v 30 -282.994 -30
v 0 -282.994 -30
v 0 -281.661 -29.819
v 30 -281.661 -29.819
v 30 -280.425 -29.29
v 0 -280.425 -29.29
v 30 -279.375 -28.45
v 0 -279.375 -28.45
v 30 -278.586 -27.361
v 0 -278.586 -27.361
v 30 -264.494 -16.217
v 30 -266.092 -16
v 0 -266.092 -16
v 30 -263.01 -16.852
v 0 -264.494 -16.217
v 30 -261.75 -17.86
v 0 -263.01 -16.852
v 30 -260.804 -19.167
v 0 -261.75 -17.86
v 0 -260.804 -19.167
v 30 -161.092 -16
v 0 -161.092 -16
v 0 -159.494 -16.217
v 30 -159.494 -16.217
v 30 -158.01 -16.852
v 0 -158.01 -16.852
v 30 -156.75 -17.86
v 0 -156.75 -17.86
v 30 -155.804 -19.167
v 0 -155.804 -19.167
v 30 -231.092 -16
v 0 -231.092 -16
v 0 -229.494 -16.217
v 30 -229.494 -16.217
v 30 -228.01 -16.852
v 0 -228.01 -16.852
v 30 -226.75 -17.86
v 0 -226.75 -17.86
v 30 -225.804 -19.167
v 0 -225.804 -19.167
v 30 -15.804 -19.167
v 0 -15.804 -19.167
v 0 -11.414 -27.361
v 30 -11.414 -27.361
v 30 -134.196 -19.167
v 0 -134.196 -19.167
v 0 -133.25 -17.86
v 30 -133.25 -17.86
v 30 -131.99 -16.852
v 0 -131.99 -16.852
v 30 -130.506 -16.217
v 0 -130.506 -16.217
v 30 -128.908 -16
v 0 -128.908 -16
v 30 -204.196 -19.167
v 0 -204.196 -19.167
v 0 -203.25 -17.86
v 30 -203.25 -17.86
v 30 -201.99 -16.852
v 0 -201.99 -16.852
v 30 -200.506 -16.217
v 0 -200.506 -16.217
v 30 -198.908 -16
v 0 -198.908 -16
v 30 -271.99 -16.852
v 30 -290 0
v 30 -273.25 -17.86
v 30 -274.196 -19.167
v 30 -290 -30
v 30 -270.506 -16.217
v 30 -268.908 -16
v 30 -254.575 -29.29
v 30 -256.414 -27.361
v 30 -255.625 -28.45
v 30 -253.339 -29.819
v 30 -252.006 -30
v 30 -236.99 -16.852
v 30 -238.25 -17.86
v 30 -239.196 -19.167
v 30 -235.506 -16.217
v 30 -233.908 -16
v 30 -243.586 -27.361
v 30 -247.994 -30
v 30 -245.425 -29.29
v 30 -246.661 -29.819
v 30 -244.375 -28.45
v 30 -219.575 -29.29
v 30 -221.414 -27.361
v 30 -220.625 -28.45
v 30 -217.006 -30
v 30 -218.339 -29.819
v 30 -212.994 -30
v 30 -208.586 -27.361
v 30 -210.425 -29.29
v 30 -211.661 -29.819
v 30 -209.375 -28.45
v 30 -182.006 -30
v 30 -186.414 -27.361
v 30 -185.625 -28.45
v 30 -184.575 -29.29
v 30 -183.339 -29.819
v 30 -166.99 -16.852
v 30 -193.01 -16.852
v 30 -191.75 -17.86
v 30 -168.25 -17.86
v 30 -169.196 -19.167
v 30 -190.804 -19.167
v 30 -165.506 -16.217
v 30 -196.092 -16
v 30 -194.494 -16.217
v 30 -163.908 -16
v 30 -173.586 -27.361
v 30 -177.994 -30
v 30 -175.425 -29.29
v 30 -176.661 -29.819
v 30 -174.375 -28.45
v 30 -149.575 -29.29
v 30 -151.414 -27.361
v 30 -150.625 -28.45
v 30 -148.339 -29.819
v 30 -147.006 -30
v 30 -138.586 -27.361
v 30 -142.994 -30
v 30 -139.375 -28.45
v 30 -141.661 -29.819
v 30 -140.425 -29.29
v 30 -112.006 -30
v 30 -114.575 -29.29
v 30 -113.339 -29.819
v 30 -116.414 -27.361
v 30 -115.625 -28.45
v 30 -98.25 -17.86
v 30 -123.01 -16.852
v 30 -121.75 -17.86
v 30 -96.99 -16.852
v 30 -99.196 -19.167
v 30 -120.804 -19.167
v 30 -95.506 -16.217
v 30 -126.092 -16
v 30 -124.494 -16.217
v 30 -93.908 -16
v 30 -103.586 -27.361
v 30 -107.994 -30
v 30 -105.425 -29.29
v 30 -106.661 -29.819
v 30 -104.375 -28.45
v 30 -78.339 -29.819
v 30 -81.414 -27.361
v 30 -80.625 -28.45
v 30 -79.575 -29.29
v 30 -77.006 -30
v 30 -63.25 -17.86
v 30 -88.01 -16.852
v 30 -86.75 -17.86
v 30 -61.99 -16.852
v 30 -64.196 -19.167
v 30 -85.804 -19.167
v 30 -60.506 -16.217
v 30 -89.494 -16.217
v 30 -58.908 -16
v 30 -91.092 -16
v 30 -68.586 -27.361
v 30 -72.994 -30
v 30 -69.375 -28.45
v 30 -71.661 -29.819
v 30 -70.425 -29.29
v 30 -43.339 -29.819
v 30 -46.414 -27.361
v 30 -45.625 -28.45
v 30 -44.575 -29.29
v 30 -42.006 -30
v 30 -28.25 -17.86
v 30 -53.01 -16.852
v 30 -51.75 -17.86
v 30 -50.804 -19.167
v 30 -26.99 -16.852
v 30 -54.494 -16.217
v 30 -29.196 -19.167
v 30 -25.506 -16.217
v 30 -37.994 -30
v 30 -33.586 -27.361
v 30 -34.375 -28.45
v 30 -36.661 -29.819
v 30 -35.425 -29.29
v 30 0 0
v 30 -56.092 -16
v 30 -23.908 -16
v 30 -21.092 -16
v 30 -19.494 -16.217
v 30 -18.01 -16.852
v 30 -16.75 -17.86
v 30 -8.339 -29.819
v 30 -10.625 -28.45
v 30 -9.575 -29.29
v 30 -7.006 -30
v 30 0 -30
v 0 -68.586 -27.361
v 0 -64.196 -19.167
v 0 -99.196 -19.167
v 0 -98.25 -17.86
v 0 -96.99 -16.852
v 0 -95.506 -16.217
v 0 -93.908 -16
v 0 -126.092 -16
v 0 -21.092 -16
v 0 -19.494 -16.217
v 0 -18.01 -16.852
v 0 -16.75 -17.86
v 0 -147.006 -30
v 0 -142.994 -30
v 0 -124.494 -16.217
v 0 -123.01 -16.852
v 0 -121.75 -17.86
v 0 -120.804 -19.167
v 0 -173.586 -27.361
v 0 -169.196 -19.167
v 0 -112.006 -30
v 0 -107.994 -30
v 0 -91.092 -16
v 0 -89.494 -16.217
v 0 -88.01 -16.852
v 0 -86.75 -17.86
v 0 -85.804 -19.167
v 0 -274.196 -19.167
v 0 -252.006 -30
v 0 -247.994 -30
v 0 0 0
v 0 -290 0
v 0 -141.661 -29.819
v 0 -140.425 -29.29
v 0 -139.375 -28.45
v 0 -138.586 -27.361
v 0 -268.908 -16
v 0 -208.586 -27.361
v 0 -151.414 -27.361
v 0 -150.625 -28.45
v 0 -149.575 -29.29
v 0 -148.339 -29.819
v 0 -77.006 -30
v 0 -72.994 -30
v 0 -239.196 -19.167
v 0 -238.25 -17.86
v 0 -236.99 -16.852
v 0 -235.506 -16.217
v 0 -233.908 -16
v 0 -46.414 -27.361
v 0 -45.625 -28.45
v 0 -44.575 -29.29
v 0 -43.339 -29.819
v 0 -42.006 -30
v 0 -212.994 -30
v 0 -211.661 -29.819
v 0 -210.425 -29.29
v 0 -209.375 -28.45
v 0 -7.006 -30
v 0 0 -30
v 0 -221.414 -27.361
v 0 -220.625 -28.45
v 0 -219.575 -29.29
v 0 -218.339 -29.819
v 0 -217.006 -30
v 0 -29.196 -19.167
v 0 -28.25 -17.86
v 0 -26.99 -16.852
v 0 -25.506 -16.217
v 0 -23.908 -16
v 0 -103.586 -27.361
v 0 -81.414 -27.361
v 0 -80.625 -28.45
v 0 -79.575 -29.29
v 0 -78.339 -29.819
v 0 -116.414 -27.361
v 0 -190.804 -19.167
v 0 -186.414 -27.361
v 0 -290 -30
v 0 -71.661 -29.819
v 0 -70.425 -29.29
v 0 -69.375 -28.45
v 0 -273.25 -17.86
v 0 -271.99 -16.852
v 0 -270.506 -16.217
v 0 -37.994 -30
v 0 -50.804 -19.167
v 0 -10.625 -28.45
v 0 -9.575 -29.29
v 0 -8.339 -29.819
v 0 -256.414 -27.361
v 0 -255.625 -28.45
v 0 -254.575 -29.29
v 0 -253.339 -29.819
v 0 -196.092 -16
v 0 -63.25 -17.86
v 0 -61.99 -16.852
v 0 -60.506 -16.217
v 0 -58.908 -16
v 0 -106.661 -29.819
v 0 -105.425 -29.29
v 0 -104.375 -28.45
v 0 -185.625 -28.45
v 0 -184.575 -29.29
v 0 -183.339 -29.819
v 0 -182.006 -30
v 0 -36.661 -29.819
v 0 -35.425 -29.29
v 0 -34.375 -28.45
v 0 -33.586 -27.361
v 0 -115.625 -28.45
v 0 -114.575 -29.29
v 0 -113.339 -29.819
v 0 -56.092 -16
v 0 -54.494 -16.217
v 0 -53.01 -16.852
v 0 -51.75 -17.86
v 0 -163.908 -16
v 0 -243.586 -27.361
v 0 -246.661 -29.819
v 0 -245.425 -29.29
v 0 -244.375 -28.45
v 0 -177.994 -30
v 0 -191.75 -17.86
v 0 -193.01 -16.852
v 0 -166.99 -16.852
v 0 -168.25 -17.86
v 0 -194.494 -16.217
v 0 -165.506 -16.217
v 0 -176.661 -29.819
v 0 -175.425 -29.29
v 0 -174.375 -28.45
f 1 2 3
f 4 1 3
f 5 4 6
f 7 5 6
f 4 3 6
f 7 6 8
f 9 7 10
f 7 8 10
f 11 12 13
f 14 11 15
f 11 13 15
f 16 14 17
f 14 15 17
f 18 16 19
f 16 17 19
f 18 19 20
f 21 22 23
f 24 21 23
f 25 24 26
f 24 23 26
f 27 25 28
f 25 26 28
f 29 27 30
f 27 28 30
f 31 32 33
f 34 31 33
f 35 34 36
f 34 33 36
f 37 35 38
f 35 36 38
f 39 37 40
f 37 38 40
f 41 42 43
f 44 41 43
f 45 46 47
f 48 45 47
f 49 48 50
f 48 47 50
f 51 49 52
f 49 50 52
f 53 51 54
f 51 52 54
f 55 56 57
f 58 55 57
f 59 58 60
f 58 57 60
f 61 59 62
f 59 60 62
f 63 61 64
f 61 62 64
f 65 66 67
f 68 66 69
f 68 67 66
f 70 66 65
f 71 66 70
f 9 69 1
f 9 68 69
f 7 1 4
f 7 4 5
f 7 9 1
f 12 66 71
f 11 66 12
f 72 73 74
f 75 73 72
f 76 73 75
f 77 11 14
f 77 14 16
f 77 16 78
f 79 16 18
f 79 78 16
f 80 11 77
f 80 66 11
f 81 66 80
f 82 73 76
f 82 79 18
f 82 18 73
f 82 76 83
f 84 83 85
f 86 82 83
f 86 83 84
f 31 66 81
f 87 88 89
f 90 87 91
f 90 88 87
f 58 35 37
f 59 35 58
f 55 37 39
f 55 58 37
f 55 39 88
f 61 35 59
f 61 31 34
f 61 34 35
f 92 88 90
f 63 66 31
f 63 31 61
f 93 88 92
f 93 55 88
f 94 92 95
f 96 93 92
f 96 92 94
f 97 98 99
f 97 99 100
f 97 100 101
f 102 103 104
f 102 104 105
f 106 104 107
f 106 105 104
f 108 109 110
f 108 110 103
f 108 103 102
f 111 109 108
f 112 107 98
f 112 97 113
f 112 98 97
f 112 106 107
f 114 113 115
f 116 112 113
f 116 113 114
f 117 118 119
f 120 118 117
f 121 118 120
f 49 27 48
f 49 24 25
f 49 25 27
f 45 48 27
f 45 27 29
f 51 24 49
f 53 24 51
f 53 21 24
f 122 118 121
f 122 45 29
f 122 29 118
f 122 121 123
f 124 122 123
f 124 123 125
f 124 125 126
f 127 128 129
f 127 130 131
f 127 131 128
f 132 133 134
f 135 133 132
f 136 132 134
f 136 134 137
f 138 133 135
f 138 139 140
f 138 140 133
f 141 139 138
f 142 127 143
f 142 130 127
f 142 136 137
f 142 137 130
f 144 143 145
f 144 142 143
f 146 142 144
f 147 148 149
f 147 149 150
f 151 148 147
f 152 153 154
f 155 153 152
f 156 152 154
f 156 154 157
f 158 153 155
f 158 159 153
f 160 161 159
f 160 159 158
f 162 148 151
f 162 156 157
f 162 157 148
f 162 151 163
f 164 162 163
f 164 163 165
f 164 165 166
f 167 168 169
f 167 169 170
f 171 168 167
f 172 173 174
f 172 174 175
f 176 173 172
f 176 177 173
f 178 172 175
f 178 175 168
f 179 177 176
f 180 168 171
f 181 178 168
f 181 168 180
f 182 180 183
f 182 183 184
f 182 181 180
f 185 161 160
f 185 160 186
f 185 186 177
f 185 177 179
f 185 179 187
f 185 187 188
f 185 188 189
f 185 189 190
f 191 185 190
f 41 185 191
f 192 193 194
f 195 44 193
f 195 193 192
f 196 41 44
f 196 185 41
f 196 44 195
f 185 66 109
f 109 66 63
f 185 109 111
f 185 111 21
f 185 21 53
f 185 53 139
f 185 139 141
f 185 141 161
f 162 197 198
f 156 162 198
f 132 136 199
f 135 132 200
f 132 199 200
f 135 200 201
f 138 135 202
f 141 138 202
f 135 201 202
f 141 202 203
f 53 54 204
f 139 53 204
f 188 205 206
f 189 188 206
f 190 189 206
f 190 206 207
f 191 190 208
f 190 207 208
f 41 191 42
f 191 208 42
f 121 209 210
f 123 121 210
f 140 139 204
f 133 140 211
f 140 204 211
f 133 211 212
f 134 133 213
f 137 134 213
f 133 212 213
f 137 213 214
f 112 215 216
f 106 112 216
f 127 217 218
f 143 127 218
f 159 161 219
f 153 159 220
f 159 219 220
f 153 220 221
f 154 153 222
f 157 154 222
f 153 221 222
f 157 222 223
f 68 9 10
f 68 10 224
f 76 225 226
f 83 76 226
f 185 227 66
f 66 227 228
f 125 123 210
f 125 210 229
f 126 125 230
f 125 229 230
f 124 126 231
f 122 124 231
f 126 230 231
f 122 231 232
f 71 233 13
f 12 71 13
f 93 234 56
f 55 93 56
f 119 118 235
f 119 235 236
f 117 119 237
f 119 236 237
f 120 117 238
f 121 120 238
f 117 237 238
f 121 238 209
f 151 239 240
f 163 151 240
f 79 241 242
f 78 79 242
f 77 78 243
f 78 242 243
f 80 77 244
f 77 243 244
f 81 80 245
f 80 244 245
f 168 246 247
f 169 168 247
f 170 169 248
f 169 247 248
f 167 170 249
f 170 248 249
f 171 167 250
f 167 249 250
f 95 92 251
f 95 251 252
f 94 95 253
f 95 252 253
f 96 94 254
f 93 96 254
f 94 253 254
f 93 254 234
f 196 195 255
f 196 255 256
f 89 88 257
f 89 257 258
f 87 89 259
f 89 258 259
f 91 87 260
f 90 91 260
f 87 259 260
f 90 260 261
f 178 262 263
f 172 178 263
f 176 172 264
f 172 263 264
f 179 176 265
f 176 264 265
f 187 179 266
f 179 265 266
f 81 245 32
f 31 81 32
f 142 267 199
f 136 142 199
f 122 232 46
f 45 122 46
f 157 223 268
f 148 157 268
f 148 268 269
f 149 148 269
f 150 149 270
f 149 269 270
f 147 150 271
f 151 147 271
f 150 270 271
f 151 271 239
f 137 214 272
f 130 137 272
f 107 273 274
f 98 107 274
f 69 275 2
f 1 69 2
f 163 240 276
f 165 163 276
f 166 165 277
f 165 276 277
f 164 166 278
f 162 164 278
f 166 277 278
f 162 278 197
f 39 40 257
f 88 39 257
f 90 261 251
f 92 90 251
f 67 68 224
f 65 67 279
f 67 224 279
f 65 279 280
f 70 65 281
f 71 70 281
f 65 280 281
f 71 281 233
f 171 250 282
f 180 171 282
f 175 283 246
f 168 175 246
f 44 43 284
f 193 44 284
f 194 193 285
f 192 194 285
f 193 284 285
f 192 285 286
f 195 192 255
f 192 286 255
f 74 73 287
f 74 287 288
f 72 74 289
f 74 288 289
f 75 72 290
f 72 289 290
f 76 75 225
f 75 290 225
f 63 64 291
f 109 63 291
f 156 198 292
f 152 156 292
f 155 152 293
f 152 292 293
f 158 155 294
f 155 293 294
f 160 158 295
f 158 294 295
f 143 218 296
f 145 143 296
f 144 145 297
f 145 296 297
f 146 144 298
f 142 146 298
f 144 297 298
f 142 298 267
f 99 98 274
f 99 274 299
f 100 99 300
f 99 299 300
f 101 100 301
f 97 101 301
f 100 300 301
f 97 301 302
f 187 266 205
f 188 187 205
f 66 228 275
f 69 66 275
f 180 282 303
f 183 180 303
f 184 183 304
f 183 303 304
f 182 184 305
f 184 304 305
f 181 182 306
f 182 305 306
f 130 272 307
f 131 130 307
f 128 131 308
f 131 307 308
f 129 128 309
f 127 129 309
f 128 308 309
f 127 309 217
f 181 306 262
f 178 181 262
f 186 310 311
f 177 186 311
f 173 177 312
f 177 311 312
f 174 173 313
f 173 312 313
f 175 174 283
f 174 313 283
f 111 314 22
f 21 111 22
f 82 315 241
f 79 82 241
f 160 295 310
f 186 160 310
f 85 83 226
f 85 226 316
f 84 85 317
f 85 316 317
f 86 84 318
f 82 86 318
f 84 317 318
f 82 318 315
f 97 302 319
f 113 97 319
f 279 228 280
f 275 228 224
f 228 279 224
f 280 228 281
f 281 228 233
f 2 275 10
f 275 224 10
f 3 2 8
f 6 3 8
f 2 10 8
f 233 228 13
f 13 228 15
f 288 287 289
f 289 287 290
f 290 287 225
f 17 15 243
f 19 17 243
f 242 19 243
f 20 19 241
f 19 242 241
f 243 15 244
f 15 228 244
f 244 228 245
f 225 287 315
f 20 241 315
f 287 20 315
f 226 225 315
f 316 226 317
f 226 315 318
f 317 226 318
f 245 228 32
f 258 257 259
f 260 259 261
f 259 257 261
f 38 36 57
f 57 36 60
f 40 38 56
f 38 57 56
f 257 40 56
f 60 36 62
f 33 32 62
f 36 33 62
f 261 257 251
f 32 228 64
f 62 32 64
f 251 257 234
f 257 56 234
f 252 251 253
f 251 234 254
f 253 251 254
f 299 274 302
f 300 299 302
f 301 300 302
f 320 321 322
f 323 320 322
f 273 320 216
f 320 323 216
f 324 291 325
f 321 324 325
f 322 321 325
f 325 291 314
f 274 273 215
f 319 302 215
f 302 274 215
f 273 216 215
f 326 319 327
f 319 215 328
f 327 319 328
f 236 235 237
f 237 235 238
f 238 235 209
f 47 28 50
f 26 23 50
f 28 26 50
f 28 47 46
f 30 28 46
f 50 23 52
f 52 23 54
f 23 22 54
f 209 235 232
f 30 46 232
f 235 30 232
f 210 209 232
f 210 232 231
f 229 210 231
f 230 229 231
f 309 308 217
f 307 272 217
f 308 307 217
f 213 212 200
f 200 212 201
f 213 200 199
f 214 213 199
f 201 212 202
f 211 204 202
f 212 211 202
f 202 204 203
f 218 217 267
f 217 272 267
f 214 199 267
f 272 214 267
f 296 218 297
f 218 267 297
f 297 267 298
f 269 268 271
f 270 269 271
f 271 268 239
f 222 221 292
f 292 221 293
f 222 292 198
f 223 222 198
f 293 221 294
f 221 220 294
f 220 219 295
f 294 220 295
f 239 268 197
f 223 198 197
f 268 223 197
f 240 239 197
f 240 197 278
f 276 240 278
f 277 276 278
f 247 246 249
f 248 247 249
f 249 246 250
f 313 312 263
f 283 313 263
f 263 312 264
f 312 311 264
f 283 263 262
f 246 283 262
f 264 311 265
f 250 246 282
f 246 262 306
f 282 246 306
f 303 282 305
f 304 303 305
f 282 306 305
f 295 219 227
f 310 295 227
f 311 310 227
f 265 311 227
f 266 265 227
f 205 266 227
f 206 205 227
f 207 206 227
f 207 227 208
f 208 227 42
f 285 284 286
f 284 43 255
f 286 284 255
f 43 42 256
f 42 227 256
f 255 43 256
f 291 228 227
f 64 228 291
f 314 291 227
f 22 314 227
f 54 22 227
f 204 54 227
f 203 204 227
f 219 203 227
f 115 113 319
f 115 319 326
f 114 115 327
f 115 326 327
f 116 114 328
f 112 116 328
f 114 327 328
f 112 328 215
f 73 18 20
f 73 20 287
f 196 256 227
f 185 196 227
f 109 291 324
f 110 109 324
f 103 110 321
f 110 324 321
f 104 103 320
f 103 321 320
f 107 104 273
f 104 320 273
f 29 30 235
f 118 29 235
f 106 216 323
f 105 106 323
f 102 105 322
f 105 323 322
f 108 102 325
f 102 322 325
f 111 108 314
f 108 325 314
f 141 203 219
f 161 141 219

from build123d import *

# Parameters (mm, degrees)
RACK_DEPTH = 30


with BuildPart() as part:
    # Sketch1 → RACK (new body)
    with BuildSketch(Plane(origin=(0, 0, 0), x_dir=(0, 0, -1), z_dir=(1, 0, 0))):
        with BuildLine():
            Line((0, 0), (0, -290))
            Line((0, -290), (30, -290))
            Line((30, -290), (30, -282.993707205))
            ThreePointArc((30, -282.993707205), (29.289844712, -280.4251994), (27.361107063, -278.586307355))
            Line((27.361107063, -278.586307355), (19.166671525, -274.196431174))
            ThreePointArc((19.166671525, -274.196431174), (16.852186345, -271.98976072), (16, -268.907551354))
            Line((16, -268.907551354), (16, -266.092448646))
            ThreePointArc((16, -266.092448646), (16.852186345, -263.01023928), (19.166671525, -260.803568826))
            Line((19.166671525, -260.803568826), (27.361107063, -256.413692645))
            ThreePointArc((27.361107063, -256.413692645), (29.289844712, -254.5748006), (30, -252.006292795))
            Line((30, -252.006292795), (30, -247.993707205))
            ThreePointArc((30, -247.993707205), (29.289844712, -245.4251994), (27.361107063, -243.586307355))
            Line((27.361107063, -243.586307355), (19.166671525, -239.196431174))
            ThreePointArc((19.166671525, -239.196431174), (16.852186345, -236.98976072), (16, -233.907551354))
            Line((16, -233.907551354), (16, -231.092448646))
            ThreePointArc((16, -231.092448646), (16.852186345, -228.01023928), (19.166671525, -225.803568826))
            Line((19.166671525, -225.803568826), (27.361107063, -221.413692645))
            ThreePointArc((27.361107063, -221.413692645), (29.289844712, -219.5748006), (30, -217.006292795))
            Line((30, -217.006292795), (30, -212.993707205))
            ThreePointArc((30, -212.993707205), (29.289844712, -210.4251994), (27.361107063, -208.586307355))
            Line((27.361107063, -208.586307355), (19.166671525, -204.196431174))
            ThreePointArc((19.166671525, -204.196431174), (16.852186345, -201.98976072), (16, -198.907551354))
            Line((16, -198.907551354), (16, -196.092448646))
            ThreePointArc((16, -196.092448646), (16.852186345, -193.01023928), (19.166671525, -190.803568826))
            Line((19.166671525, -190.803568826), (27.361107063, -186.413692645))
            ThreePointArc((27.361107063, -186.413692645), (29.289844712, -184.5748006), (30, -182.006292795))
            Line((30, -182.006292795), (30, -177.993707205))
            ThreePointArc((30, -177.993707205), (29.289844712, -175.4251994), (27.361107063, -173.586307355))
            Line((27.361107063, -173.586307355), (19.166671525, -169.196431174))
            ThreePointArc((19.166671525, -169.196431174), (16.852186345, -166.98976072), (16, -163.907551354))
            Line((16, -163.907551354), (16, -161.092448646))
            ThreePointArc((16, -161.092448646), (16.852186345, -158.01023928), (19.166671525, -155.803568826))
            Line((19.166671525, -155.803568826), (27.361107063, -151.413692645))
            ThreePointArc((27.361107063, -151.413692645), (29.289844712, -149.5748006), (30, -147.006292795))
            Line((30, -147.006292795), (30, -142.993707205))
            ThreePointArc((30, -142.993707205), (29.289844712, -140.4251994), (27.361107063, -138.586307355))
            Line((27.361107063, -138.586307355), (19.166671525, -134.196431174))
            ThreePointArc((19.166671525, -134.196431174), (16.852186345, -131.98976072), (16, -128.907551354))
            Line((16, -128.907551354), (16, -126.092448646))
            ThreePointArc((16, -126.092448646), (16.852186345, -123.01023928), (19.166671525, -120.803568826))
            Line((19.166671525, -120.803568826), (27.361107063, -116.413692645))
            ThreePointArc((27.361107063, -116.413692645), (29.289844712, -114.5748006), (30, -112.006292795))
            Line((30, -112.006292795), (30, -107.993707205))
            ThreePointArc((30, -107.993707205), (29.289844712, -105.4251994), (27.361107063, -103.586307355))
            Line((27.361107063, -103.586307355), (19.166671525, -99.196431174))
            ThreePointArc((19.166671525, -99.196431174), (16.852186345, -96.98976072), (16, -93.907551354))
            Line((16, -93.907551354), (16, -91.092448646))
            ThreePointArc((16, -91.092448646), (16.852186345, -88.01023928), (19.166671525, -85.803568826))
            Line((19.166671525, -85.803568826), (27.361107063, -81.413692645))
            ThreePointArc((27.361107063, -81.413692645), (29.289844712, -79.5748006), (30, -77.006292795))
            Line((30, -77.006292795), (30, -72.993707205))
            ThreePointArc((30, -72.993707205), (29.289844712, -70.4251994), (27.361107063, -68.586307355))
            Line((27.361107063, -68.586307355), (19.166671525, -64.196431174))
            ThreePointArc((19.166671525, -64.196431174), (16.852186345, -61.98976072), (16, -58.907551354))
            Line((16, -58.907551354), (16, -56.092448646))
            ThreePointArc((16, -56.092448646), (16.852186345, -53.01023928), (19.166671525, -50.803568826))
            Line((19.166671525, -50.803568826), (27.361107063, -46.413692645))
            ThreePointArc((27.361107063, -46.413692645), (29.289844712, -44.5748006), (30, -42.006292795))
            Line((30, -42.006292795), (30, -37.993707205))
            ThreePointArc((30, -37.993707205), (29.289844712, -35.4251994), (27.361107063, -33.586307355))
            Line((27.361107063, -33.586307355), (19.166671525, -29.196431174))
            ThreePointArc((19.166671525, -29.196431174), (16.852186345, -26.98976072), (16, -23.907551354))
            Line((16, -23.907551354), (16, -21.092448646))
            ThreePointArc((16, -21.092448646), (16.852186345, -18.01023928), (19.166671525, -15.803568826))
            Line((19.166671525, -15.803568826), (27.361107063, -11.413692645))
            ThreePointArc((27.361107063, -11.413692645), (29.289844712, -9.5748006), (30, -7.006292795))
            Line((30, -7.006292795), (30, 0))
            Line((30, 0), (0, 0))
        make_face()
    extrude(amount=RACK_DEPTH)


solid = part.part
